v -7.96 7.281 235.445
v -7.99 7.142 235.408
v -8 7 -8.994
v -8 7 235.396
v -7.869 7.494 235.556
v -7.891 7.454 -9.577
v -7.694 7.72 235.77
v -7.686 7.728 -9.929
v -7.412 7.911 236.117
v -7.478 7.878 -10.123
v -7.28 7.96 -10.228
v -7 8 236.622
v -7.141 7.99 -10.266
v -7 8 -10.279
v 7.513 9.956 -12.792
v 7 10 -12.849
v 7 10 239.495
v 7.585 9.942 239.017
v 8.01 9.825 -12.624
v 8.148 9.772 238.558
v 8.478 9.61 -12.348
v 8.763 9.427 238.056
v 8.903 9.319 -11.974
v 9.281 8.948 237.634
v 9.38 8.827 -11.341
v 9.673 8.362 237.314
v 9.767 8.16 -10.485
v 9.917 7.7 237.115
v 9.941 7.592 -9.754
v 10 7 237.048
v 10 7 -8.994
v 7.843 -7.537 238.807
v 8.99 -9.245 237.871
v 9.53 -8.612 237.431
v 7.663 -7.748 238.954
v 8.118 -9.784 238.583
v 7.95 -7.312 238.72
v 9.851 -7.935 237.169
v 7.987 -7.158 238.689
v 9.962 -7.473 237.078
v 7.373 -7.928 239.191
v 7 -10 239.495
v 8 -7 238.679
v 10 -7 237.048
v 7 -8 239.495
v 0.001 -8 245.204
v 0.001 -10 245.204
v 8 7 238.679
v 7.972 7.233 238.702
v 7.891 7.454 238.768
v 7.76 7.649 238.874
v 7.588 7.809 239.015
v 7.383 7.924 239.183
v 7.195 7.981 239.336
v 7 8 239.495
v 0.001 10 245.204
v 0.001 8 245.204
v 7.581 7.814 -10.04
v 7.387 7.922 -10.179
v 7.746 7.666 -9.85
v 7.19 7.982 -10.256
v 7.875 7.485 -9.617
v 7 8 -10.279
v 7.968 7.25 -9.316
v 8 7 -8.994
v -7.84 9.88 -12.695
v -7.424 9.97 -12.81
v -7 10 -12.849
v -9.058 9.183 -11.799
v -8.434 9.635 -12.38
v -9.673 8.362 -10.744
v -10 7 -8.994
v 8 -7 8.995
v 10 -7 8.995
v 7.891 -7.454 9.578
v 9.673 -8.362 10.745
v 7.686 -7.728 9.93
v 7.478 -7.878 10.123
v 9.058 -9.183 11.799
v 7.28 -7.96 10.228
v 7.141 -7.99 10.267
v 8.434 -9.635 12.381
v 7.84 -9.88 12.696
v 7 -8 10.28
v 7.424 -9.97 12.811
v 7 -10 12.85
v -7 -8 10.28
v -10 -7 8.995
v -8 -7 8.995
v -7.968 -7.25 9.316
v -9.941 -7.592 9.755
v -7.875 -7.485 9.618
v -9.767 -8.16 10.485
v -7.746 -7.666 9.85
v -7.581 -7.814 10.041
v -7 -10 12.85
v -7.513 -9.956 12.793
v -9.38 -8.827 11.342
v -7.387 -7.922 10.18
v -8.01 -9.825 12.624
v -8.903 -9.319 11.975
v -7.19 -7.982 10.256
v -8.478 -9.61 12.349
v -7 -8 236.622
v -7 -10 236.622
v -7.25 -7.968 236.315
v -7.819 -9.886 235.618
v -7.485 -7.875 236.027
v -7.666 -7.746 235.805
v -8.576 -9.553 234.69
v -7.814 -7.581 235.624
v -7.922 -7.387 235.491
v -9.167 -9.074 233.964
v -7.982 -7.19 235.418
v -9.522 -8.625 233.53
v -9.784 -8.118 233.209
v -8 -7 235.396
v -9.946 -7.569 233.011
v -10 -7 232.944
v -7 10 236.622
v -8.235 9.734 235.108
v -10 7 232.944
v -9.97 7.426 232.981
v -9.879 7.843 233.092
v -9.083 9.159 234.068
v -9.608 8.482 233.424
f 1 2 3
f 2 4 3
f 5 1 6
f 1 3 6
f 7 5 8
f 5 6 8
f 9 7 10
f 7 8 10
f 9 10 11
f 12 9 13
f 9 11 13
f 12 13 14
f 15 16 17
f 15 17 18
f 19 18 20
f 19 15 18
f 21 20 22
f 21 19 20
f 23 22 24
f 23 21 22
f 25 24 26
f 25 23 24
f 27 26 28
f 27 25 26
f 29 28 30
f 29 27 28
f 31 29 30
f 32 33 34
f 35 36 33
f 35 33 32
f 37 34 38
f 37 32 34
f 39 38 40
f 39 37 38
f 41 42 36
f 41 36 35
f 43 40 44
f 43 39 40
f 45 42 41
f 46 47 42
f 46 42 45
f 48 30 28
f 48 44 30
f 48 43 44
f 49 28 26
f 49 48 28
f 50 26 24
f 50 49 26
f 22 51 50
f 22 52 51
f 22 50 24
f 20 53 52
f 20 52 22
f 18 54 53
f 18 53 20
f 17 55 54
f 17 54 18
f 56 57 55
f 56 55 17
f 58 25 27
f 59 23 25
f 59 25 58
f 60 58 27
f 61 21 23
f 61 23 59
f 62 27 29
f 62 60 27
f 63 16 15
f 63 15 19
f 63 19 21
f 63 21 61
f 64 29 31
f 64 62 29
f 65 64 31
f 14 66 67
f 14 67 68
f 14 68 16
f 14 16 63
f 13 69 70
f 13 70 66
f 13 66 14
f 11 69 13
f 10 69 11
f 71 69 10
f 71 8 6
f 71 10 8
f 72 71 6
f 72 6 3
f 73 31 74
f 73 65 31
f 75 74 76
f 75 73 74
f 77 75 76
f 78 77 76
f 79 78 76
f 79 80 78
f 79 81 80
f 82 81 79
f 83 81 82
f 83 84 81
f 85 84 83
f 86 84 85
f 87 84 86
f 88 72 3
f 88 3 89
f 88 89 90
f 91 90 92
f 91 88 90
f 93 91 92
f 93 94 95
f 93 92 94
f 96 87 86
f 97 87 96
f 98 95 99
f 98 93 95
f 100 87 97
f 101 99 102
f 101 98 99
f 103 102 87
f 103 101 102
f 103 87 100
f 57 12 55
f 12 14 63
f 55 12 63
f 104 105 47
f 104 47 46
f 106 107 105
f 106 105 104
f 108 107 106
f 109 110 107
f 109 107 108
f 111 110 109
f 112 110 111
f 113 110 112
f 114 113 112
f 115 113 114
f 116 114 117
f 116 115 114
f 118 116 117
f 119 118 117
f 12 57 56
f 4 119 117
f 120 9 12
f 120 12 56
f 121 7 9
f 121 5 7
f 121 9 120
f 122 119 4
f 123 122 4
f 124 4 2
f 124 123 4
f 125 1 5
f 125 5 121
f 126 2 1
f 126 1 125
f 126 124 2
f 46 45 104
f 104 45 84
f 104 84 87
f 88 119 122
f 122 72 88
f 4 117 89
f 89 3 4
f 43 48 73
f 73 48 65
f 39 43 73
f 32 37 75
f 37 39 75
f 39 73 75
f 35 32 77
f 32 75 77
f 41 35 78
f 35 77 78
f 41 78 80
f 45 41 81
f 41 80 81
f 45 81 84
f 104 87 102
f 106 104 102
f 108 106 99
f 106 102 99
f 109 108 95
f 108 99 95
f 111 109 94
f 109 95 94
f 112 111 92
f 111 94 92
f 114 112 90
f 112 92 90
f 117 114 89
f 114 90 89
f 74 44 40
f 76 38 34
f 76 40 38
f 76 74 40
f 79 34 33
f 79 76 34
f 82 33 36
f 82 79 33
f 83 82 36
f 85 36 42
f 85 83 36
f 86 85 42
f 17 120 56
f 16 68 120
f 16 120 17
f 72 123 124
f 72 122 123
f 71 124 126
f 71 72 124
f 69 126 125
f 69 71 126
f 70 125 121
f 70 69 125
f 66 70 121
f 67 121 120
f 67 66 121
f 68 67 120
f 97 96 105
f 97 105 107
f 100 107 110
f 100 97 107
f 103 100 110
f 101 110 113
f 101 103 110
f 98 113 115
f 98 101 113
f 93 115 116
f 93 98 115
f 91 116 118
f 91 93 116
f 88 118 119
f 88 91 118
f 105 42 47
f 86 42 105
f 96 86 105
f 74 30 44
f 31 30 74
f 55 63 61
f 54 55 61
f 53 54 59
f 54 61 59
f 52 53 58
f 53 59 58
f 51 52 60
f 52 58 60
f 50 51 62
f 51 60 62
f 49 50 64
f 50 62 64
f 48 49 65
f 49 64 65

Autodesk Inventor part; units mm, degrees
ref_plane "Start Plane" through (0, 0, -12.8489) normal (0, 0, 1) x (1, 0, 0)
ref_plane "End Plane" through (0, 0, 245.204) normal (0, 0, 1) x (1, 0, 0)
sketch "Sketch" plane through (0, 0, 0) normal (0, 0, 1) x (1, 0, 0)
  line L0 (-10, -7) -> (-10, 7)
  line L1 (-7, 10) -> (7, 10)
  line L2 (10, 7) -> (10, -7)
  line L3 (7, -10) -> (-7, -10)
  arc A0 (-10, -7) -> (-7, -10) centre (-7, -7) ccw
  arc A1 (-7, 10) -> (-10, 7) centre (-7, 7) ccw
  arc A2 (10, 7) -> (7, 10) centre (7, 7) ccw
  arc A3 (7, -10) -> (10, -7) centre (7, -7) ccw
  arc A4 (-7, 8) -> (-8, 7) centre (-7, 7) ccw
  line L4 (-7, 8) -> (7, 8)
  arc A5 (8, 7) -> (7, 8) centre (7, 7) ccw
  line L5 (8, 7) -> (8, -7)
  arc A6 (7, -8) -> (8, -7) centre (7, -7) ccw
  line L6 (7, -8) -> (-7, -8)
  arc A7 (-8, -7) -> (-7, -8) centre (-7, -7) ccw
  line L7 (-8, -7) -> (-8, 7)
  line L8 (0, 14.8698) -> (0, -14.8698) construction
  line L9 (-14.8698, 0) -> (14.8698, 0) construction
  dimension "d7" = 3
  dimension "d10" = 20
  dimension "d11" = 20
  dimension "d12" = 2
  dimension "d15" = 10
  dimension "d16" = 10
extrude "Body" add sketch "Sketch" along normal up to surface (258.0529 mm away) from surface at -12.8489
sketch "Sketch3" plane through (0, 0, 0) normal (0, 0, 1) x (1, 0, 0)
  line L0 (0, 0) -> (10, 0)
ref_plane "Work Plane3" through (0, 0, 0) normal (0, -1, 0) x (1, 0, 0)
sketch "Sketch4" plane through (0, 0, 0) normal (0, -1, 0) x (1, 0, 0)
  line L0 (-2, -12.8489) -> (12, -12.8489)
  line L1 (-2, 245.204) -> (12, 245.204)
  dimension "d18" = 258.0529
ref_plane "Work Plane4" through (-10, 0, 253.3619) normal (0.6321, 0, 0.7749) x (0.7749, 0, -0.6321)
split "Split1" plane through (-10, 0, 253.3619) removes the side toward (0.6321, 0, 0.7749)
ref_plane "Work Plane5" through (10, 0, 257.4621) normal (-0.7749, 0, 0.6321) x (0.6321, 0, 0.7749)
split "Split2" plane through (10, 0, 257.4621) removes the side toward (-0.7749, 0, 0.6321)
ref_plane "Work Plane6" through (0, 10, -12.8489) normal (0, -0.7892, -0.6142) x (1, 0, 0)
split "Split3" plane through (0, 10, -12.8489) removes the side toward (0, -0.7892, -0.6142)
equation "\"d7\" = G_IR"
equation "\"d10\" = G_H"
equation "\"d11\" = G_W"
equation "\"d12\" = G_T"
equation "\"d15\" = 0.5 * d10"
equation "\"d16\" = 0.5 * d11"
equation "\"d3\" = G_L"
equation "\"G_W\" = 20"
equation "\"G_H\" = 20"
equation "\"G_T\" = 2"
equation "\"G_IR\" = 3"
equation "\"G_L\" = d18"
equation "\"G_OFFSET_START\" = 12.84887"
equation "\"G_OFFSET_END\" = 0"
equation "\"d13\" = -G_OFFSET_START"
equation "\"d14\" = G_OFFSET_END + B_L"
equation "\"B_L\" = 245.204"
properties part number "ISO 12633-2 - 20x20x2 - 258.05" material "Steel, Mild"
